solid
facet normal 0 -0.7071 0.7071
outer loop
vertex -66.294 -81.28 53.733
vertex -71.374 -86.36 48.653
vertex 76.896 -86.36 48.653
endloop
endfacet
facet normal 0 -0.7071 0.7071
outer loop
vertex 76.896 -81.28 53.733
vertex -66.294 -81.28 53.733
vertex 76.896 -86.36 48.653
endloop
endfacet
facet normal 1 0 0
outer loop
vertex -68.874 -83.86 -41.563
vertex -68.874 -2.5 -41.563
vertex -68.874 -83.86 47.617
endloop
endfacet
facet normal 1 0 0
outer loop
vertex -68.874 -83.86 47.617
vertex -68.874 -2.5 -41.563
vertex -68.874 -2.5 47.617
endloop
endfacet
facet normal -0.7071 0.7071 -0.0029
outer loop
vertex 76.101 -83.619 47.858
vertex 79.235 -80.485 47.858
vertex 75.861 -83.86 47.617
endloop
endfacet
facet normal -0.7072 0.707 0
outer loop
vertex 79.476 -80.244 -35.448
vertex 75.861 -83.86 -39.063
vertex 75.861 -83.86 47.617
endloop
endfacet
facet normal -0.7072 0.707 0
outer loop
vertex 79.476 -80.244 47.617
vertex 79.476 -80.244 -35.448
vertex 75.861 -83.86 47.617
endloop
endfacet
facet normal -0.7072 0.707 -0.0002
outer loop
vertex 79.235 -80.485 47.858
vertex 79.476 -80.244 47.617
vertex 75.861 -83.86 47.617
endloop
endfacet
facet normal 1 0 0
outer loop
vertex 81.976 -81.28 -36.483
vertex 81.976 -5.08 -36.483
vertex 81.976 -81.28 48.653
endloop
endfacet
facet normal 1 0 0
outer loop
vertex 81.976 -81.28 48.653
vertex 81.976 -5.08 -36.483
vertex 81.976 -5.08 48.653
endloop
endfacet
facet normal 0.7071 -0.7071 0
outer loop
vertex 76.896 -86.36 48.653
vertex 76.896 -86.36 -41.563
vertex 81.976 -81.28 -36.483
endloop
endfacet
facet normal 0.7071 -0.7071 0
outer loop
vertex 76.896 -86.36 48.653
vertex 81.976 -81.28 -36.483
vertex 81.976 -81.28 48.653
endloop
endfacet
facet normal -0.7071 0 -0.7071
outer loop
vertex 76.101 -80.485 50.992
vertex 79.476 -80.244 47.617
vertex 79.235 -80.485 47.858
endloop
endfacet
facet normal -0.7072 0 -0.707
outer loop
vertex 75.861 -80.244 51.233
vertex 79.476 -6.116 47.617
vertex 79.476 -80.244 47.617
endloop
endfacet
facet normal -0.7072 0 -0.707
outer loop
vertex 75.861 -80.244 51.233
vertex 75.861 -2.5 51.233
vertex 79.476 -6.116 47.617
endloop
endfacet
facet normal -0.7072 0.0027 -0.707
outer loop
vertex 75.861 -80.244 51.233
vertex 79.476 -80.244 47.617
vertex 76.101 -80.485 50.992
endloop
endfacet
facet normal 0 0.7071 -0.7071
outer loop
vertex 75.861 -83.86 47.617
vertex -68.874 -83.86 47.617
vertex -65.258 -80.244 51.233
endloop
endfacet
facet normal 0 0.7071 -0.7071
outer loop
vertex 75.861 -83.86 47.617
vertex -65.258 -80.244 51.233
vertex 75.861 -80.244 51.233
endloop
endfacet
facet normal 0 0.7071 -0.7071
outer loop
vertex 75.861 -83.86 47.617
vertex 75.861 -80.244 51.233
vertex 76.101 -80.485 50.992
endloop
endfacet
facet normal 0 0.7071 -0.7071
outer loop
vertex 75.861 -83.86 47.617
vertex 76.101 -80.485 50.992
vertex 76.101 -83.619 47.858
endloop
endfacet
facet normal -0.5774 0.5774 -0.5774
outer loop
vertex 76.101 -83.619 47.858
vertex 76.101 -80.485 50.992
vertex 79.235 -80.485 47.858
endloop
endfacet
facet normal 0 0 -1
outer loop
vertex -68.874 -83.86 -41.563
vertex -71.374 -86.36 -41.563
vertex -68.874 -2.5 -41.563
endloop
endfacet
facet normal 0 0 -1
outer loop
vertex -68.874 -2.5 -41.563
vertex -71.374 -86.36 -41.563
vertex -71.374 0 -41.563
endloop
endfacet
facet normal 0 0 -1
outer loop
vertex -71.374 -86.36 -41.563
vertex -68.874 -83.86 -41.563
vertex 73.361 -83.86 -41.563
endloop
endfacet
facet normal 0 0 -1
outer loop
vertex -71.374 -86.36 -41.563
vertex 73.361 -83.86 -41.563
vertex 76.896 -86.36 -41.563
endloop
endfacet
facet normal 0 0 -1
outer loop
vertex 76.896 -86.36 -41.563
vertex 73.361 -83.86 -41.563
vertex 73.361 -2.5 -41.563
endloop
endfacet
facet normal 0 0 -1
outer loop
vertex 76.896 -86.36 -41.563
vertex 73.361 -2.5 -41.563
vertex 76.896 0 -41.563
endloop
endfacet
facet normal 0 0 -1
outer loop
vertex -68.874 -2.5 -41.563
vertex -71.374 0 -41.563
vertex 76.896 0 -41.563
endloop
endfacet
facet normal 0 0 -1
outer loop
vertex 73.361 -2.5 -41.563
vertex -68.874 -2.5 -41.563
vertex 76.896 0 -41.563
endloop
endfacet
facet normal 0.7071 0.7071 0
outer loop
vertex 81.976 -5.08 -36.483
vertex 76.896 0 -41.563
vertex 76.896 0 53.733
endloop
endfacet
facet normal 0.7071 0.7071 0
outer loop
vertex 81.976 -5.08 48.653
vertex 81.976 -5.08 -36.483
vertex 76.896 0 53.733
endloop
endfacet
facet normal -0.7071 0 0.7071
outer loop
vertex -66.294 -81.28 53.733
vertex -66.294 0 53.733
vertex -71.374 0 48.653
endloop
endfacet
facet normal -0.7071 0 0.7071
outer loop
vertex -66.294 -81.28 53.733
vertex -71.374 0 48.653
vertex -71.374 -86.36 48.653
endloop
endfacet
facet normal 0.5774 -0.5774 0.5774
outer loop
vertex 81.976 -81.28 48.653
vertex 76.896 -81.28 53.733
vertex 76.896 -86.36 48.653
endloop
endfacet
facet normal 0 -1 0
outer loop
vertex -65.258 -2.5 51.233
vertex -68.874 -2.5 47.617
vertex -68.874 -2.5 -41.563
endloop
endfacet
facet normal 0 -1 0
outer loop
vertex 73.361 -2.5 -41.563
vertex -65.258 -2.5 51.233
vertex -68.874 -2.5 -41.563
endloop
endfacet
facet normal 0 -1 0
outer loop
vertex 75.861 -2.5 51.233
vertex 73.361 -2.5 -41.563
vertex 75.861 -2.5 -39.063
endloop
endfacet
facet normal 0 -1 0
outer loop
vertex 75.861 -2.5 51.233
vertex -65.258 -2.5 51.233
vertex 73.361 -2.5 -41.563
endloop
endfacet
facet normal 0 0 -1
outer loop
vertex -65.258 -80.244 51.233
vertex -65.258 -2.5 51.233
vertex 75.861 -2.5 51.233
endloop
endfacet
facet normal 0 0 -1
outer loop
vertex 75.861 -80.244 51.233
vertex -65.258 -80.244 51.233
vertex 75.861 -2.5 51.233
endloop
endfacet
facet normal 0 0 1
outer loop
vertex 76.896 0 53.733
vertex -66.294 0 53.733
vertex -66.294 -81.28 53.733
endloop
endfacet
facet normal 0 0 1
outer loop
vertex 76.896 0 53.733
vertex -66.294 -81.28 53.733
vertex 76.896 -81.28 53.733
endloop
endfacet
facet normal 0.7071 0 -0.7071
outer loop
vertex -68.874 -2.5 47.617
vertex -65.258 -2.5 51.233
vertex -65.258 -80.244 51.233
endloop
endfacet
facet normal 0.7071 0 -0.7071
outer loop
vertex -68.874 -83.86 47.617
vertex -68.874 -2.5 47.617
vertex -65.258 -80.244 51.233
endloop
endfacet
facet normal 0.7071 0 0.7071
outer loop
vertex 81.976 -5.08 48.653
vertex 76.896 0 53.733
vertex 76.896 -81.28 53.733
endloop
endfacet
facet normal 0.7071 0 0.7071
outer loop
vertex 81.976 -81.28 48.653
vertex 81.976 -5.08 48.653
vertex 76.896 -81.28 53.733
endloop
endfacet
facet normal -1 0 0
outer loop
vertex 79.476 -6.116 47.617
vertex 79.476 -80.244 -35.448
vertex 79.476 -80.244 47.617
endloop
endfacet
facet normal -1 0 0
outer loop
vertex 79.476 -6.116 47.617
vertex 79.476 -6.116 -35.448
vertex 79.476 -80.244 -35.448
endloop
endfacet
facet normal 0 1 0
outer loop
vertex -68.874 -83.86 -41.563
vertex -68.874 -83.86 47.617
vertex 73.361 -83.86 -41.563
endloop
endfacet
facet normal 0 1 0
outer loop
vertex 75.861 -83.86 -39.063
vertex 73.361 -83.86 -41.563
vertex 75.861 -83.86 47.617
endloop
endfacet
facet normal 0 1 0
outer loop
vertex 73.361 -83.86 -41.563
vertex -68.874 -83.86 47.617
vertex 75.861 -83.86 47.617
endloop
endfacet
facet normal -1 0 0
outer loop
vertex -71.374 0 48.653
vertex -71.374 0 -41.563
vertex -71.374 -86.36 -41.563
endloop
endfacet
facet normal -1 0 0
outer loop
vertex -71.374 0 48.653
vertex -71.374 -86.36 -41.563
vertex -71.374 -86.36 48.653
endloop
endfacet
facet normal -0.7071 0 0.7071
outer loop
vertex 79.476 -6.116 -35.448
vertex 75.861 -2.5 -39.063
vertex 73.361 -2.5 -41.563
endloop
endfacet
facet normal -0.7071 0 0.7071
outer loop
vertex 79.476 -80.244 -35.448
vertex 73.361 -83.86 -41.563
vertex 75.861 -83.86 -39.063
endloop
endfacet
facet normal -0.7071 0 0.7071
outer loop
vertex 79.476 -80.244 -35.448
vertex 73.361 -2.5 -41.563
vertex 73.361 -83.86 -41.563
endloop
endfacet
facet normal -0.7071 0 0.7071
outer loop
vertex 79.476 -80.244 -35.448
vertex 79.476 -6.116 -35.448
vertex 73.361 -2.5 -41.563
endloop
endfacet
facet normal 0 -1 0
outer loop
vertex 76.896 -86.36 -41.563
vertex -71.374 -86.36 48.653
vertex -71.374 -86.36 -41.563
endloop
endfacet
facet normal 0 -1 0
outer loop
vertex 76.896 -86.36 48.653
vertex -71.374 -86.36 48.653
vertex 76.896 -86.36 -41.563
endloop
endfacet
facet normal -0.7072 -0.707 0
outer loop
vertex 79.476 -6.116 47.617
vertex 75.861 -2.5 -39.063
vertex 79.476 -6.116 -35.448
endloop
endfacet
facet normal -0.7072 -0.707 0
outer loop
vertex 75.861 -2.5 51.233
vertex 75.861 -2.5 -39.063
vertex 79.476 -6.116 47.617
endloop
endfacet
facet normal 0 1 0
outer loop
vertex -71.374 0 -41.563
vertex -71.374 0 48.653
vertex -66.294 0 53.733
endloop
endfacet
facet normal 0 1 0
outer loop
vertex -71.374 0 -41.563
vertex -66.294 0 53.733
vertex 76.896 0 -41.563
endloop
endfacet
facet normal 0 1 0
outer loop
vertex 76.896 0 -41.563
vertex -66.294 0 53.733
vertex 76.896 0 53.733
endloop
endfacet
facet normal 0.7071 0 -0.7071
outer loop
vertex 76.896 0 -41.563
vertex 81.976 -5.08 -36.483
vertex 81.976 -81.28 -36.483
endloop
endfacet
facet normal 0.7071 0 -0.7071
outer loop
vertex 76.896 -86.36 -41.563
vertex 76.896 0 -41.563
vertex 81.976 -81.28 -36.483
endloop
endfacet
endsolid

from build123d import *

# Parameters (mm, degrees)
F0_W     = 153.35001
F0_H     = 95.295806
F1_DEPTH = 86.36
F2_SIZE  = 5.08
F3_T     = -2.5


with BuildPart() as f1:
    # F0 (on Front) → F1 (new body)
    with BuildSketch(Plane.XZ):
        with Locations((5.301088, 6.084798)):
            Rectangle(F0_W, F0_H)
    extrude(amount=F1_DEPTH)

    # F2
    f2_edges = [f1.edges().sort_by_distance(p)[0] for p in [
        (5.301088, -86.36, 53.732701),
        (81.976093, -43.18, 53.732701),
        (-71.373917, -43.18, 53.732701),
        (81.976093, -86.36, 6.084798),
        (81.976093, 0, 6.084798),
        (81.976093, -43.18, -41.563105),
    ]]
    chamfer(f2_edges, length=F2_SIZE)

    # F3
    f3_openings = [f1.faces().sort_by_distance(p)[0] for p in [
        (2.761088, -43.18, -41.563105),
    ]]
    offset(amount=F3_T, openings=f3_openings)


solid = f1.part
